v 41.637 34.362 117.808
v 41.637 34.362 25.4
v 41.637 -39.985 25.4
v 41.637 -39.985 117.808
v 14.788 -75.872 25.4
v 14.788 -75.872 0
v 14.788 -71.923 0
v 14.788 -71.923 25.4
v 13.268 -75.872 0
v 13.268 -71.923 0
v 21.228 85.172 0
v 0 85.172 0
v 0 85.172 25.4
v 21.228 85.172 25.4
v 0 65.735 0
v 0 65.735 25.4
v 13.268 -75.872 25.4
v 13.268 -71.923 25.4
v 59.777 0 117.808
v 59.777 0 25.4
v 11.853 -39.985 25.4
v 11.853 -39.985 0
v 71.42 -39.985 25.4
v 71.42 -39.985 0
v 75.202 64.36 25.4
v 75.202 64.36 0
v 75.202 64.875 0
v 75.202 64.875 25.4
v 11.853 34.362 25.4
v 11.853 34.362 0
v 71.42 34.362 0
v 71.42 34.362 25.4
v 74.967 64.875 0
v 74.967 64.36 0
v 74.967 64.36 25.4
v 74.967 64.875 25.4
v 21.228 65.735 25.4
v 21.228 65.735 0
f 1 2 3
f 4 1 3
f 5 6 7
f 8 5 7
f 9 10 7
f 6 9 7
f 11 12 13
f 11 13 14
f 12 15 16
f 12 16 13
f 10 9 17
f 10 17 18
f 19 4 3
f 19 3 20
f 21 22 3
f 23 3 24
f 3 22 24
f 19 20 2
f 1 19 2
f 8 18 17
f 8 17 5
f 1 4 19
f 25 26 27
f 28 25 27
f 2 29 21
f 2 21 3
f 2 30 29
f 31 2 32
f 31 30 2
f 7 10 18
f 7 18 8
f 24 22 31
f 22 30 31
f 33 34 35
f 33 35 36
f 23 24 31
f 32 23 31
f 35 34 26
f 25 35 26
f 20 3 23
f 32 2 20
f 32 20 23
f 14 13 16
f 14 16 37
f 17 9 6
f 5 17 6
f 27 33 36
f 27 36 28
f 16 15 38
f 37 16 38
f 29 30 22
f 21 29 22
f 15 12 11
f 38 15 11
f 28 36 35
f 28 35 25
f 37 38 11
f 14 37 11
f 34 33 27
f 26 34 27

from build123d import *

# Parameters (mm, degrees)
F0_W     = 59.567481
F0_H     = 39.984807
F0_H_2   = 34.362406
F0_W_2   = 0.234723
F0_H_3   = 0.515759
F0_W_3   = 1.520488
F0_H_4   = 3.949255
F0_W_4   = 21.228462
F0_H_5   = 19.436843
F1_DEPTH = 25.4
F3_DEPTH = 92.408458


with BuildPart() as f1:
    # F0 (on Top) → F1 (new body)
    with BuildSketch(Plane.XY):
        with Locations((41.636705, -19.992403)):
            Rectangle(F0_W, F0_H)
        with Locations((41.636705, 17.181203)):
            Rectangle(F0_W, F0_H_2)
        with Locations((75.084671, 64.617418)):
            Rectangle(F0_W_2, F0_H_3)
        with Locations((14.028238, -73.897451)):
            Rectangle(F0_W_3, F0_H_4)
        with Locations((10.614231, 75.453307)):
            Rectangle(F0_W_4, F0_H_5)
    extrude(amount=F1_DEPTH)

    # F2 (on face) → F3 (join)
    with BuildSketch(Plane.XY.offset(25.4)):
        Polygon((41.636705, 34.362406), (41.636705, -39.984807), (59.776627, 0), align=None)
    extrude(amount=F3_DEPTH)


solid = f1.part
